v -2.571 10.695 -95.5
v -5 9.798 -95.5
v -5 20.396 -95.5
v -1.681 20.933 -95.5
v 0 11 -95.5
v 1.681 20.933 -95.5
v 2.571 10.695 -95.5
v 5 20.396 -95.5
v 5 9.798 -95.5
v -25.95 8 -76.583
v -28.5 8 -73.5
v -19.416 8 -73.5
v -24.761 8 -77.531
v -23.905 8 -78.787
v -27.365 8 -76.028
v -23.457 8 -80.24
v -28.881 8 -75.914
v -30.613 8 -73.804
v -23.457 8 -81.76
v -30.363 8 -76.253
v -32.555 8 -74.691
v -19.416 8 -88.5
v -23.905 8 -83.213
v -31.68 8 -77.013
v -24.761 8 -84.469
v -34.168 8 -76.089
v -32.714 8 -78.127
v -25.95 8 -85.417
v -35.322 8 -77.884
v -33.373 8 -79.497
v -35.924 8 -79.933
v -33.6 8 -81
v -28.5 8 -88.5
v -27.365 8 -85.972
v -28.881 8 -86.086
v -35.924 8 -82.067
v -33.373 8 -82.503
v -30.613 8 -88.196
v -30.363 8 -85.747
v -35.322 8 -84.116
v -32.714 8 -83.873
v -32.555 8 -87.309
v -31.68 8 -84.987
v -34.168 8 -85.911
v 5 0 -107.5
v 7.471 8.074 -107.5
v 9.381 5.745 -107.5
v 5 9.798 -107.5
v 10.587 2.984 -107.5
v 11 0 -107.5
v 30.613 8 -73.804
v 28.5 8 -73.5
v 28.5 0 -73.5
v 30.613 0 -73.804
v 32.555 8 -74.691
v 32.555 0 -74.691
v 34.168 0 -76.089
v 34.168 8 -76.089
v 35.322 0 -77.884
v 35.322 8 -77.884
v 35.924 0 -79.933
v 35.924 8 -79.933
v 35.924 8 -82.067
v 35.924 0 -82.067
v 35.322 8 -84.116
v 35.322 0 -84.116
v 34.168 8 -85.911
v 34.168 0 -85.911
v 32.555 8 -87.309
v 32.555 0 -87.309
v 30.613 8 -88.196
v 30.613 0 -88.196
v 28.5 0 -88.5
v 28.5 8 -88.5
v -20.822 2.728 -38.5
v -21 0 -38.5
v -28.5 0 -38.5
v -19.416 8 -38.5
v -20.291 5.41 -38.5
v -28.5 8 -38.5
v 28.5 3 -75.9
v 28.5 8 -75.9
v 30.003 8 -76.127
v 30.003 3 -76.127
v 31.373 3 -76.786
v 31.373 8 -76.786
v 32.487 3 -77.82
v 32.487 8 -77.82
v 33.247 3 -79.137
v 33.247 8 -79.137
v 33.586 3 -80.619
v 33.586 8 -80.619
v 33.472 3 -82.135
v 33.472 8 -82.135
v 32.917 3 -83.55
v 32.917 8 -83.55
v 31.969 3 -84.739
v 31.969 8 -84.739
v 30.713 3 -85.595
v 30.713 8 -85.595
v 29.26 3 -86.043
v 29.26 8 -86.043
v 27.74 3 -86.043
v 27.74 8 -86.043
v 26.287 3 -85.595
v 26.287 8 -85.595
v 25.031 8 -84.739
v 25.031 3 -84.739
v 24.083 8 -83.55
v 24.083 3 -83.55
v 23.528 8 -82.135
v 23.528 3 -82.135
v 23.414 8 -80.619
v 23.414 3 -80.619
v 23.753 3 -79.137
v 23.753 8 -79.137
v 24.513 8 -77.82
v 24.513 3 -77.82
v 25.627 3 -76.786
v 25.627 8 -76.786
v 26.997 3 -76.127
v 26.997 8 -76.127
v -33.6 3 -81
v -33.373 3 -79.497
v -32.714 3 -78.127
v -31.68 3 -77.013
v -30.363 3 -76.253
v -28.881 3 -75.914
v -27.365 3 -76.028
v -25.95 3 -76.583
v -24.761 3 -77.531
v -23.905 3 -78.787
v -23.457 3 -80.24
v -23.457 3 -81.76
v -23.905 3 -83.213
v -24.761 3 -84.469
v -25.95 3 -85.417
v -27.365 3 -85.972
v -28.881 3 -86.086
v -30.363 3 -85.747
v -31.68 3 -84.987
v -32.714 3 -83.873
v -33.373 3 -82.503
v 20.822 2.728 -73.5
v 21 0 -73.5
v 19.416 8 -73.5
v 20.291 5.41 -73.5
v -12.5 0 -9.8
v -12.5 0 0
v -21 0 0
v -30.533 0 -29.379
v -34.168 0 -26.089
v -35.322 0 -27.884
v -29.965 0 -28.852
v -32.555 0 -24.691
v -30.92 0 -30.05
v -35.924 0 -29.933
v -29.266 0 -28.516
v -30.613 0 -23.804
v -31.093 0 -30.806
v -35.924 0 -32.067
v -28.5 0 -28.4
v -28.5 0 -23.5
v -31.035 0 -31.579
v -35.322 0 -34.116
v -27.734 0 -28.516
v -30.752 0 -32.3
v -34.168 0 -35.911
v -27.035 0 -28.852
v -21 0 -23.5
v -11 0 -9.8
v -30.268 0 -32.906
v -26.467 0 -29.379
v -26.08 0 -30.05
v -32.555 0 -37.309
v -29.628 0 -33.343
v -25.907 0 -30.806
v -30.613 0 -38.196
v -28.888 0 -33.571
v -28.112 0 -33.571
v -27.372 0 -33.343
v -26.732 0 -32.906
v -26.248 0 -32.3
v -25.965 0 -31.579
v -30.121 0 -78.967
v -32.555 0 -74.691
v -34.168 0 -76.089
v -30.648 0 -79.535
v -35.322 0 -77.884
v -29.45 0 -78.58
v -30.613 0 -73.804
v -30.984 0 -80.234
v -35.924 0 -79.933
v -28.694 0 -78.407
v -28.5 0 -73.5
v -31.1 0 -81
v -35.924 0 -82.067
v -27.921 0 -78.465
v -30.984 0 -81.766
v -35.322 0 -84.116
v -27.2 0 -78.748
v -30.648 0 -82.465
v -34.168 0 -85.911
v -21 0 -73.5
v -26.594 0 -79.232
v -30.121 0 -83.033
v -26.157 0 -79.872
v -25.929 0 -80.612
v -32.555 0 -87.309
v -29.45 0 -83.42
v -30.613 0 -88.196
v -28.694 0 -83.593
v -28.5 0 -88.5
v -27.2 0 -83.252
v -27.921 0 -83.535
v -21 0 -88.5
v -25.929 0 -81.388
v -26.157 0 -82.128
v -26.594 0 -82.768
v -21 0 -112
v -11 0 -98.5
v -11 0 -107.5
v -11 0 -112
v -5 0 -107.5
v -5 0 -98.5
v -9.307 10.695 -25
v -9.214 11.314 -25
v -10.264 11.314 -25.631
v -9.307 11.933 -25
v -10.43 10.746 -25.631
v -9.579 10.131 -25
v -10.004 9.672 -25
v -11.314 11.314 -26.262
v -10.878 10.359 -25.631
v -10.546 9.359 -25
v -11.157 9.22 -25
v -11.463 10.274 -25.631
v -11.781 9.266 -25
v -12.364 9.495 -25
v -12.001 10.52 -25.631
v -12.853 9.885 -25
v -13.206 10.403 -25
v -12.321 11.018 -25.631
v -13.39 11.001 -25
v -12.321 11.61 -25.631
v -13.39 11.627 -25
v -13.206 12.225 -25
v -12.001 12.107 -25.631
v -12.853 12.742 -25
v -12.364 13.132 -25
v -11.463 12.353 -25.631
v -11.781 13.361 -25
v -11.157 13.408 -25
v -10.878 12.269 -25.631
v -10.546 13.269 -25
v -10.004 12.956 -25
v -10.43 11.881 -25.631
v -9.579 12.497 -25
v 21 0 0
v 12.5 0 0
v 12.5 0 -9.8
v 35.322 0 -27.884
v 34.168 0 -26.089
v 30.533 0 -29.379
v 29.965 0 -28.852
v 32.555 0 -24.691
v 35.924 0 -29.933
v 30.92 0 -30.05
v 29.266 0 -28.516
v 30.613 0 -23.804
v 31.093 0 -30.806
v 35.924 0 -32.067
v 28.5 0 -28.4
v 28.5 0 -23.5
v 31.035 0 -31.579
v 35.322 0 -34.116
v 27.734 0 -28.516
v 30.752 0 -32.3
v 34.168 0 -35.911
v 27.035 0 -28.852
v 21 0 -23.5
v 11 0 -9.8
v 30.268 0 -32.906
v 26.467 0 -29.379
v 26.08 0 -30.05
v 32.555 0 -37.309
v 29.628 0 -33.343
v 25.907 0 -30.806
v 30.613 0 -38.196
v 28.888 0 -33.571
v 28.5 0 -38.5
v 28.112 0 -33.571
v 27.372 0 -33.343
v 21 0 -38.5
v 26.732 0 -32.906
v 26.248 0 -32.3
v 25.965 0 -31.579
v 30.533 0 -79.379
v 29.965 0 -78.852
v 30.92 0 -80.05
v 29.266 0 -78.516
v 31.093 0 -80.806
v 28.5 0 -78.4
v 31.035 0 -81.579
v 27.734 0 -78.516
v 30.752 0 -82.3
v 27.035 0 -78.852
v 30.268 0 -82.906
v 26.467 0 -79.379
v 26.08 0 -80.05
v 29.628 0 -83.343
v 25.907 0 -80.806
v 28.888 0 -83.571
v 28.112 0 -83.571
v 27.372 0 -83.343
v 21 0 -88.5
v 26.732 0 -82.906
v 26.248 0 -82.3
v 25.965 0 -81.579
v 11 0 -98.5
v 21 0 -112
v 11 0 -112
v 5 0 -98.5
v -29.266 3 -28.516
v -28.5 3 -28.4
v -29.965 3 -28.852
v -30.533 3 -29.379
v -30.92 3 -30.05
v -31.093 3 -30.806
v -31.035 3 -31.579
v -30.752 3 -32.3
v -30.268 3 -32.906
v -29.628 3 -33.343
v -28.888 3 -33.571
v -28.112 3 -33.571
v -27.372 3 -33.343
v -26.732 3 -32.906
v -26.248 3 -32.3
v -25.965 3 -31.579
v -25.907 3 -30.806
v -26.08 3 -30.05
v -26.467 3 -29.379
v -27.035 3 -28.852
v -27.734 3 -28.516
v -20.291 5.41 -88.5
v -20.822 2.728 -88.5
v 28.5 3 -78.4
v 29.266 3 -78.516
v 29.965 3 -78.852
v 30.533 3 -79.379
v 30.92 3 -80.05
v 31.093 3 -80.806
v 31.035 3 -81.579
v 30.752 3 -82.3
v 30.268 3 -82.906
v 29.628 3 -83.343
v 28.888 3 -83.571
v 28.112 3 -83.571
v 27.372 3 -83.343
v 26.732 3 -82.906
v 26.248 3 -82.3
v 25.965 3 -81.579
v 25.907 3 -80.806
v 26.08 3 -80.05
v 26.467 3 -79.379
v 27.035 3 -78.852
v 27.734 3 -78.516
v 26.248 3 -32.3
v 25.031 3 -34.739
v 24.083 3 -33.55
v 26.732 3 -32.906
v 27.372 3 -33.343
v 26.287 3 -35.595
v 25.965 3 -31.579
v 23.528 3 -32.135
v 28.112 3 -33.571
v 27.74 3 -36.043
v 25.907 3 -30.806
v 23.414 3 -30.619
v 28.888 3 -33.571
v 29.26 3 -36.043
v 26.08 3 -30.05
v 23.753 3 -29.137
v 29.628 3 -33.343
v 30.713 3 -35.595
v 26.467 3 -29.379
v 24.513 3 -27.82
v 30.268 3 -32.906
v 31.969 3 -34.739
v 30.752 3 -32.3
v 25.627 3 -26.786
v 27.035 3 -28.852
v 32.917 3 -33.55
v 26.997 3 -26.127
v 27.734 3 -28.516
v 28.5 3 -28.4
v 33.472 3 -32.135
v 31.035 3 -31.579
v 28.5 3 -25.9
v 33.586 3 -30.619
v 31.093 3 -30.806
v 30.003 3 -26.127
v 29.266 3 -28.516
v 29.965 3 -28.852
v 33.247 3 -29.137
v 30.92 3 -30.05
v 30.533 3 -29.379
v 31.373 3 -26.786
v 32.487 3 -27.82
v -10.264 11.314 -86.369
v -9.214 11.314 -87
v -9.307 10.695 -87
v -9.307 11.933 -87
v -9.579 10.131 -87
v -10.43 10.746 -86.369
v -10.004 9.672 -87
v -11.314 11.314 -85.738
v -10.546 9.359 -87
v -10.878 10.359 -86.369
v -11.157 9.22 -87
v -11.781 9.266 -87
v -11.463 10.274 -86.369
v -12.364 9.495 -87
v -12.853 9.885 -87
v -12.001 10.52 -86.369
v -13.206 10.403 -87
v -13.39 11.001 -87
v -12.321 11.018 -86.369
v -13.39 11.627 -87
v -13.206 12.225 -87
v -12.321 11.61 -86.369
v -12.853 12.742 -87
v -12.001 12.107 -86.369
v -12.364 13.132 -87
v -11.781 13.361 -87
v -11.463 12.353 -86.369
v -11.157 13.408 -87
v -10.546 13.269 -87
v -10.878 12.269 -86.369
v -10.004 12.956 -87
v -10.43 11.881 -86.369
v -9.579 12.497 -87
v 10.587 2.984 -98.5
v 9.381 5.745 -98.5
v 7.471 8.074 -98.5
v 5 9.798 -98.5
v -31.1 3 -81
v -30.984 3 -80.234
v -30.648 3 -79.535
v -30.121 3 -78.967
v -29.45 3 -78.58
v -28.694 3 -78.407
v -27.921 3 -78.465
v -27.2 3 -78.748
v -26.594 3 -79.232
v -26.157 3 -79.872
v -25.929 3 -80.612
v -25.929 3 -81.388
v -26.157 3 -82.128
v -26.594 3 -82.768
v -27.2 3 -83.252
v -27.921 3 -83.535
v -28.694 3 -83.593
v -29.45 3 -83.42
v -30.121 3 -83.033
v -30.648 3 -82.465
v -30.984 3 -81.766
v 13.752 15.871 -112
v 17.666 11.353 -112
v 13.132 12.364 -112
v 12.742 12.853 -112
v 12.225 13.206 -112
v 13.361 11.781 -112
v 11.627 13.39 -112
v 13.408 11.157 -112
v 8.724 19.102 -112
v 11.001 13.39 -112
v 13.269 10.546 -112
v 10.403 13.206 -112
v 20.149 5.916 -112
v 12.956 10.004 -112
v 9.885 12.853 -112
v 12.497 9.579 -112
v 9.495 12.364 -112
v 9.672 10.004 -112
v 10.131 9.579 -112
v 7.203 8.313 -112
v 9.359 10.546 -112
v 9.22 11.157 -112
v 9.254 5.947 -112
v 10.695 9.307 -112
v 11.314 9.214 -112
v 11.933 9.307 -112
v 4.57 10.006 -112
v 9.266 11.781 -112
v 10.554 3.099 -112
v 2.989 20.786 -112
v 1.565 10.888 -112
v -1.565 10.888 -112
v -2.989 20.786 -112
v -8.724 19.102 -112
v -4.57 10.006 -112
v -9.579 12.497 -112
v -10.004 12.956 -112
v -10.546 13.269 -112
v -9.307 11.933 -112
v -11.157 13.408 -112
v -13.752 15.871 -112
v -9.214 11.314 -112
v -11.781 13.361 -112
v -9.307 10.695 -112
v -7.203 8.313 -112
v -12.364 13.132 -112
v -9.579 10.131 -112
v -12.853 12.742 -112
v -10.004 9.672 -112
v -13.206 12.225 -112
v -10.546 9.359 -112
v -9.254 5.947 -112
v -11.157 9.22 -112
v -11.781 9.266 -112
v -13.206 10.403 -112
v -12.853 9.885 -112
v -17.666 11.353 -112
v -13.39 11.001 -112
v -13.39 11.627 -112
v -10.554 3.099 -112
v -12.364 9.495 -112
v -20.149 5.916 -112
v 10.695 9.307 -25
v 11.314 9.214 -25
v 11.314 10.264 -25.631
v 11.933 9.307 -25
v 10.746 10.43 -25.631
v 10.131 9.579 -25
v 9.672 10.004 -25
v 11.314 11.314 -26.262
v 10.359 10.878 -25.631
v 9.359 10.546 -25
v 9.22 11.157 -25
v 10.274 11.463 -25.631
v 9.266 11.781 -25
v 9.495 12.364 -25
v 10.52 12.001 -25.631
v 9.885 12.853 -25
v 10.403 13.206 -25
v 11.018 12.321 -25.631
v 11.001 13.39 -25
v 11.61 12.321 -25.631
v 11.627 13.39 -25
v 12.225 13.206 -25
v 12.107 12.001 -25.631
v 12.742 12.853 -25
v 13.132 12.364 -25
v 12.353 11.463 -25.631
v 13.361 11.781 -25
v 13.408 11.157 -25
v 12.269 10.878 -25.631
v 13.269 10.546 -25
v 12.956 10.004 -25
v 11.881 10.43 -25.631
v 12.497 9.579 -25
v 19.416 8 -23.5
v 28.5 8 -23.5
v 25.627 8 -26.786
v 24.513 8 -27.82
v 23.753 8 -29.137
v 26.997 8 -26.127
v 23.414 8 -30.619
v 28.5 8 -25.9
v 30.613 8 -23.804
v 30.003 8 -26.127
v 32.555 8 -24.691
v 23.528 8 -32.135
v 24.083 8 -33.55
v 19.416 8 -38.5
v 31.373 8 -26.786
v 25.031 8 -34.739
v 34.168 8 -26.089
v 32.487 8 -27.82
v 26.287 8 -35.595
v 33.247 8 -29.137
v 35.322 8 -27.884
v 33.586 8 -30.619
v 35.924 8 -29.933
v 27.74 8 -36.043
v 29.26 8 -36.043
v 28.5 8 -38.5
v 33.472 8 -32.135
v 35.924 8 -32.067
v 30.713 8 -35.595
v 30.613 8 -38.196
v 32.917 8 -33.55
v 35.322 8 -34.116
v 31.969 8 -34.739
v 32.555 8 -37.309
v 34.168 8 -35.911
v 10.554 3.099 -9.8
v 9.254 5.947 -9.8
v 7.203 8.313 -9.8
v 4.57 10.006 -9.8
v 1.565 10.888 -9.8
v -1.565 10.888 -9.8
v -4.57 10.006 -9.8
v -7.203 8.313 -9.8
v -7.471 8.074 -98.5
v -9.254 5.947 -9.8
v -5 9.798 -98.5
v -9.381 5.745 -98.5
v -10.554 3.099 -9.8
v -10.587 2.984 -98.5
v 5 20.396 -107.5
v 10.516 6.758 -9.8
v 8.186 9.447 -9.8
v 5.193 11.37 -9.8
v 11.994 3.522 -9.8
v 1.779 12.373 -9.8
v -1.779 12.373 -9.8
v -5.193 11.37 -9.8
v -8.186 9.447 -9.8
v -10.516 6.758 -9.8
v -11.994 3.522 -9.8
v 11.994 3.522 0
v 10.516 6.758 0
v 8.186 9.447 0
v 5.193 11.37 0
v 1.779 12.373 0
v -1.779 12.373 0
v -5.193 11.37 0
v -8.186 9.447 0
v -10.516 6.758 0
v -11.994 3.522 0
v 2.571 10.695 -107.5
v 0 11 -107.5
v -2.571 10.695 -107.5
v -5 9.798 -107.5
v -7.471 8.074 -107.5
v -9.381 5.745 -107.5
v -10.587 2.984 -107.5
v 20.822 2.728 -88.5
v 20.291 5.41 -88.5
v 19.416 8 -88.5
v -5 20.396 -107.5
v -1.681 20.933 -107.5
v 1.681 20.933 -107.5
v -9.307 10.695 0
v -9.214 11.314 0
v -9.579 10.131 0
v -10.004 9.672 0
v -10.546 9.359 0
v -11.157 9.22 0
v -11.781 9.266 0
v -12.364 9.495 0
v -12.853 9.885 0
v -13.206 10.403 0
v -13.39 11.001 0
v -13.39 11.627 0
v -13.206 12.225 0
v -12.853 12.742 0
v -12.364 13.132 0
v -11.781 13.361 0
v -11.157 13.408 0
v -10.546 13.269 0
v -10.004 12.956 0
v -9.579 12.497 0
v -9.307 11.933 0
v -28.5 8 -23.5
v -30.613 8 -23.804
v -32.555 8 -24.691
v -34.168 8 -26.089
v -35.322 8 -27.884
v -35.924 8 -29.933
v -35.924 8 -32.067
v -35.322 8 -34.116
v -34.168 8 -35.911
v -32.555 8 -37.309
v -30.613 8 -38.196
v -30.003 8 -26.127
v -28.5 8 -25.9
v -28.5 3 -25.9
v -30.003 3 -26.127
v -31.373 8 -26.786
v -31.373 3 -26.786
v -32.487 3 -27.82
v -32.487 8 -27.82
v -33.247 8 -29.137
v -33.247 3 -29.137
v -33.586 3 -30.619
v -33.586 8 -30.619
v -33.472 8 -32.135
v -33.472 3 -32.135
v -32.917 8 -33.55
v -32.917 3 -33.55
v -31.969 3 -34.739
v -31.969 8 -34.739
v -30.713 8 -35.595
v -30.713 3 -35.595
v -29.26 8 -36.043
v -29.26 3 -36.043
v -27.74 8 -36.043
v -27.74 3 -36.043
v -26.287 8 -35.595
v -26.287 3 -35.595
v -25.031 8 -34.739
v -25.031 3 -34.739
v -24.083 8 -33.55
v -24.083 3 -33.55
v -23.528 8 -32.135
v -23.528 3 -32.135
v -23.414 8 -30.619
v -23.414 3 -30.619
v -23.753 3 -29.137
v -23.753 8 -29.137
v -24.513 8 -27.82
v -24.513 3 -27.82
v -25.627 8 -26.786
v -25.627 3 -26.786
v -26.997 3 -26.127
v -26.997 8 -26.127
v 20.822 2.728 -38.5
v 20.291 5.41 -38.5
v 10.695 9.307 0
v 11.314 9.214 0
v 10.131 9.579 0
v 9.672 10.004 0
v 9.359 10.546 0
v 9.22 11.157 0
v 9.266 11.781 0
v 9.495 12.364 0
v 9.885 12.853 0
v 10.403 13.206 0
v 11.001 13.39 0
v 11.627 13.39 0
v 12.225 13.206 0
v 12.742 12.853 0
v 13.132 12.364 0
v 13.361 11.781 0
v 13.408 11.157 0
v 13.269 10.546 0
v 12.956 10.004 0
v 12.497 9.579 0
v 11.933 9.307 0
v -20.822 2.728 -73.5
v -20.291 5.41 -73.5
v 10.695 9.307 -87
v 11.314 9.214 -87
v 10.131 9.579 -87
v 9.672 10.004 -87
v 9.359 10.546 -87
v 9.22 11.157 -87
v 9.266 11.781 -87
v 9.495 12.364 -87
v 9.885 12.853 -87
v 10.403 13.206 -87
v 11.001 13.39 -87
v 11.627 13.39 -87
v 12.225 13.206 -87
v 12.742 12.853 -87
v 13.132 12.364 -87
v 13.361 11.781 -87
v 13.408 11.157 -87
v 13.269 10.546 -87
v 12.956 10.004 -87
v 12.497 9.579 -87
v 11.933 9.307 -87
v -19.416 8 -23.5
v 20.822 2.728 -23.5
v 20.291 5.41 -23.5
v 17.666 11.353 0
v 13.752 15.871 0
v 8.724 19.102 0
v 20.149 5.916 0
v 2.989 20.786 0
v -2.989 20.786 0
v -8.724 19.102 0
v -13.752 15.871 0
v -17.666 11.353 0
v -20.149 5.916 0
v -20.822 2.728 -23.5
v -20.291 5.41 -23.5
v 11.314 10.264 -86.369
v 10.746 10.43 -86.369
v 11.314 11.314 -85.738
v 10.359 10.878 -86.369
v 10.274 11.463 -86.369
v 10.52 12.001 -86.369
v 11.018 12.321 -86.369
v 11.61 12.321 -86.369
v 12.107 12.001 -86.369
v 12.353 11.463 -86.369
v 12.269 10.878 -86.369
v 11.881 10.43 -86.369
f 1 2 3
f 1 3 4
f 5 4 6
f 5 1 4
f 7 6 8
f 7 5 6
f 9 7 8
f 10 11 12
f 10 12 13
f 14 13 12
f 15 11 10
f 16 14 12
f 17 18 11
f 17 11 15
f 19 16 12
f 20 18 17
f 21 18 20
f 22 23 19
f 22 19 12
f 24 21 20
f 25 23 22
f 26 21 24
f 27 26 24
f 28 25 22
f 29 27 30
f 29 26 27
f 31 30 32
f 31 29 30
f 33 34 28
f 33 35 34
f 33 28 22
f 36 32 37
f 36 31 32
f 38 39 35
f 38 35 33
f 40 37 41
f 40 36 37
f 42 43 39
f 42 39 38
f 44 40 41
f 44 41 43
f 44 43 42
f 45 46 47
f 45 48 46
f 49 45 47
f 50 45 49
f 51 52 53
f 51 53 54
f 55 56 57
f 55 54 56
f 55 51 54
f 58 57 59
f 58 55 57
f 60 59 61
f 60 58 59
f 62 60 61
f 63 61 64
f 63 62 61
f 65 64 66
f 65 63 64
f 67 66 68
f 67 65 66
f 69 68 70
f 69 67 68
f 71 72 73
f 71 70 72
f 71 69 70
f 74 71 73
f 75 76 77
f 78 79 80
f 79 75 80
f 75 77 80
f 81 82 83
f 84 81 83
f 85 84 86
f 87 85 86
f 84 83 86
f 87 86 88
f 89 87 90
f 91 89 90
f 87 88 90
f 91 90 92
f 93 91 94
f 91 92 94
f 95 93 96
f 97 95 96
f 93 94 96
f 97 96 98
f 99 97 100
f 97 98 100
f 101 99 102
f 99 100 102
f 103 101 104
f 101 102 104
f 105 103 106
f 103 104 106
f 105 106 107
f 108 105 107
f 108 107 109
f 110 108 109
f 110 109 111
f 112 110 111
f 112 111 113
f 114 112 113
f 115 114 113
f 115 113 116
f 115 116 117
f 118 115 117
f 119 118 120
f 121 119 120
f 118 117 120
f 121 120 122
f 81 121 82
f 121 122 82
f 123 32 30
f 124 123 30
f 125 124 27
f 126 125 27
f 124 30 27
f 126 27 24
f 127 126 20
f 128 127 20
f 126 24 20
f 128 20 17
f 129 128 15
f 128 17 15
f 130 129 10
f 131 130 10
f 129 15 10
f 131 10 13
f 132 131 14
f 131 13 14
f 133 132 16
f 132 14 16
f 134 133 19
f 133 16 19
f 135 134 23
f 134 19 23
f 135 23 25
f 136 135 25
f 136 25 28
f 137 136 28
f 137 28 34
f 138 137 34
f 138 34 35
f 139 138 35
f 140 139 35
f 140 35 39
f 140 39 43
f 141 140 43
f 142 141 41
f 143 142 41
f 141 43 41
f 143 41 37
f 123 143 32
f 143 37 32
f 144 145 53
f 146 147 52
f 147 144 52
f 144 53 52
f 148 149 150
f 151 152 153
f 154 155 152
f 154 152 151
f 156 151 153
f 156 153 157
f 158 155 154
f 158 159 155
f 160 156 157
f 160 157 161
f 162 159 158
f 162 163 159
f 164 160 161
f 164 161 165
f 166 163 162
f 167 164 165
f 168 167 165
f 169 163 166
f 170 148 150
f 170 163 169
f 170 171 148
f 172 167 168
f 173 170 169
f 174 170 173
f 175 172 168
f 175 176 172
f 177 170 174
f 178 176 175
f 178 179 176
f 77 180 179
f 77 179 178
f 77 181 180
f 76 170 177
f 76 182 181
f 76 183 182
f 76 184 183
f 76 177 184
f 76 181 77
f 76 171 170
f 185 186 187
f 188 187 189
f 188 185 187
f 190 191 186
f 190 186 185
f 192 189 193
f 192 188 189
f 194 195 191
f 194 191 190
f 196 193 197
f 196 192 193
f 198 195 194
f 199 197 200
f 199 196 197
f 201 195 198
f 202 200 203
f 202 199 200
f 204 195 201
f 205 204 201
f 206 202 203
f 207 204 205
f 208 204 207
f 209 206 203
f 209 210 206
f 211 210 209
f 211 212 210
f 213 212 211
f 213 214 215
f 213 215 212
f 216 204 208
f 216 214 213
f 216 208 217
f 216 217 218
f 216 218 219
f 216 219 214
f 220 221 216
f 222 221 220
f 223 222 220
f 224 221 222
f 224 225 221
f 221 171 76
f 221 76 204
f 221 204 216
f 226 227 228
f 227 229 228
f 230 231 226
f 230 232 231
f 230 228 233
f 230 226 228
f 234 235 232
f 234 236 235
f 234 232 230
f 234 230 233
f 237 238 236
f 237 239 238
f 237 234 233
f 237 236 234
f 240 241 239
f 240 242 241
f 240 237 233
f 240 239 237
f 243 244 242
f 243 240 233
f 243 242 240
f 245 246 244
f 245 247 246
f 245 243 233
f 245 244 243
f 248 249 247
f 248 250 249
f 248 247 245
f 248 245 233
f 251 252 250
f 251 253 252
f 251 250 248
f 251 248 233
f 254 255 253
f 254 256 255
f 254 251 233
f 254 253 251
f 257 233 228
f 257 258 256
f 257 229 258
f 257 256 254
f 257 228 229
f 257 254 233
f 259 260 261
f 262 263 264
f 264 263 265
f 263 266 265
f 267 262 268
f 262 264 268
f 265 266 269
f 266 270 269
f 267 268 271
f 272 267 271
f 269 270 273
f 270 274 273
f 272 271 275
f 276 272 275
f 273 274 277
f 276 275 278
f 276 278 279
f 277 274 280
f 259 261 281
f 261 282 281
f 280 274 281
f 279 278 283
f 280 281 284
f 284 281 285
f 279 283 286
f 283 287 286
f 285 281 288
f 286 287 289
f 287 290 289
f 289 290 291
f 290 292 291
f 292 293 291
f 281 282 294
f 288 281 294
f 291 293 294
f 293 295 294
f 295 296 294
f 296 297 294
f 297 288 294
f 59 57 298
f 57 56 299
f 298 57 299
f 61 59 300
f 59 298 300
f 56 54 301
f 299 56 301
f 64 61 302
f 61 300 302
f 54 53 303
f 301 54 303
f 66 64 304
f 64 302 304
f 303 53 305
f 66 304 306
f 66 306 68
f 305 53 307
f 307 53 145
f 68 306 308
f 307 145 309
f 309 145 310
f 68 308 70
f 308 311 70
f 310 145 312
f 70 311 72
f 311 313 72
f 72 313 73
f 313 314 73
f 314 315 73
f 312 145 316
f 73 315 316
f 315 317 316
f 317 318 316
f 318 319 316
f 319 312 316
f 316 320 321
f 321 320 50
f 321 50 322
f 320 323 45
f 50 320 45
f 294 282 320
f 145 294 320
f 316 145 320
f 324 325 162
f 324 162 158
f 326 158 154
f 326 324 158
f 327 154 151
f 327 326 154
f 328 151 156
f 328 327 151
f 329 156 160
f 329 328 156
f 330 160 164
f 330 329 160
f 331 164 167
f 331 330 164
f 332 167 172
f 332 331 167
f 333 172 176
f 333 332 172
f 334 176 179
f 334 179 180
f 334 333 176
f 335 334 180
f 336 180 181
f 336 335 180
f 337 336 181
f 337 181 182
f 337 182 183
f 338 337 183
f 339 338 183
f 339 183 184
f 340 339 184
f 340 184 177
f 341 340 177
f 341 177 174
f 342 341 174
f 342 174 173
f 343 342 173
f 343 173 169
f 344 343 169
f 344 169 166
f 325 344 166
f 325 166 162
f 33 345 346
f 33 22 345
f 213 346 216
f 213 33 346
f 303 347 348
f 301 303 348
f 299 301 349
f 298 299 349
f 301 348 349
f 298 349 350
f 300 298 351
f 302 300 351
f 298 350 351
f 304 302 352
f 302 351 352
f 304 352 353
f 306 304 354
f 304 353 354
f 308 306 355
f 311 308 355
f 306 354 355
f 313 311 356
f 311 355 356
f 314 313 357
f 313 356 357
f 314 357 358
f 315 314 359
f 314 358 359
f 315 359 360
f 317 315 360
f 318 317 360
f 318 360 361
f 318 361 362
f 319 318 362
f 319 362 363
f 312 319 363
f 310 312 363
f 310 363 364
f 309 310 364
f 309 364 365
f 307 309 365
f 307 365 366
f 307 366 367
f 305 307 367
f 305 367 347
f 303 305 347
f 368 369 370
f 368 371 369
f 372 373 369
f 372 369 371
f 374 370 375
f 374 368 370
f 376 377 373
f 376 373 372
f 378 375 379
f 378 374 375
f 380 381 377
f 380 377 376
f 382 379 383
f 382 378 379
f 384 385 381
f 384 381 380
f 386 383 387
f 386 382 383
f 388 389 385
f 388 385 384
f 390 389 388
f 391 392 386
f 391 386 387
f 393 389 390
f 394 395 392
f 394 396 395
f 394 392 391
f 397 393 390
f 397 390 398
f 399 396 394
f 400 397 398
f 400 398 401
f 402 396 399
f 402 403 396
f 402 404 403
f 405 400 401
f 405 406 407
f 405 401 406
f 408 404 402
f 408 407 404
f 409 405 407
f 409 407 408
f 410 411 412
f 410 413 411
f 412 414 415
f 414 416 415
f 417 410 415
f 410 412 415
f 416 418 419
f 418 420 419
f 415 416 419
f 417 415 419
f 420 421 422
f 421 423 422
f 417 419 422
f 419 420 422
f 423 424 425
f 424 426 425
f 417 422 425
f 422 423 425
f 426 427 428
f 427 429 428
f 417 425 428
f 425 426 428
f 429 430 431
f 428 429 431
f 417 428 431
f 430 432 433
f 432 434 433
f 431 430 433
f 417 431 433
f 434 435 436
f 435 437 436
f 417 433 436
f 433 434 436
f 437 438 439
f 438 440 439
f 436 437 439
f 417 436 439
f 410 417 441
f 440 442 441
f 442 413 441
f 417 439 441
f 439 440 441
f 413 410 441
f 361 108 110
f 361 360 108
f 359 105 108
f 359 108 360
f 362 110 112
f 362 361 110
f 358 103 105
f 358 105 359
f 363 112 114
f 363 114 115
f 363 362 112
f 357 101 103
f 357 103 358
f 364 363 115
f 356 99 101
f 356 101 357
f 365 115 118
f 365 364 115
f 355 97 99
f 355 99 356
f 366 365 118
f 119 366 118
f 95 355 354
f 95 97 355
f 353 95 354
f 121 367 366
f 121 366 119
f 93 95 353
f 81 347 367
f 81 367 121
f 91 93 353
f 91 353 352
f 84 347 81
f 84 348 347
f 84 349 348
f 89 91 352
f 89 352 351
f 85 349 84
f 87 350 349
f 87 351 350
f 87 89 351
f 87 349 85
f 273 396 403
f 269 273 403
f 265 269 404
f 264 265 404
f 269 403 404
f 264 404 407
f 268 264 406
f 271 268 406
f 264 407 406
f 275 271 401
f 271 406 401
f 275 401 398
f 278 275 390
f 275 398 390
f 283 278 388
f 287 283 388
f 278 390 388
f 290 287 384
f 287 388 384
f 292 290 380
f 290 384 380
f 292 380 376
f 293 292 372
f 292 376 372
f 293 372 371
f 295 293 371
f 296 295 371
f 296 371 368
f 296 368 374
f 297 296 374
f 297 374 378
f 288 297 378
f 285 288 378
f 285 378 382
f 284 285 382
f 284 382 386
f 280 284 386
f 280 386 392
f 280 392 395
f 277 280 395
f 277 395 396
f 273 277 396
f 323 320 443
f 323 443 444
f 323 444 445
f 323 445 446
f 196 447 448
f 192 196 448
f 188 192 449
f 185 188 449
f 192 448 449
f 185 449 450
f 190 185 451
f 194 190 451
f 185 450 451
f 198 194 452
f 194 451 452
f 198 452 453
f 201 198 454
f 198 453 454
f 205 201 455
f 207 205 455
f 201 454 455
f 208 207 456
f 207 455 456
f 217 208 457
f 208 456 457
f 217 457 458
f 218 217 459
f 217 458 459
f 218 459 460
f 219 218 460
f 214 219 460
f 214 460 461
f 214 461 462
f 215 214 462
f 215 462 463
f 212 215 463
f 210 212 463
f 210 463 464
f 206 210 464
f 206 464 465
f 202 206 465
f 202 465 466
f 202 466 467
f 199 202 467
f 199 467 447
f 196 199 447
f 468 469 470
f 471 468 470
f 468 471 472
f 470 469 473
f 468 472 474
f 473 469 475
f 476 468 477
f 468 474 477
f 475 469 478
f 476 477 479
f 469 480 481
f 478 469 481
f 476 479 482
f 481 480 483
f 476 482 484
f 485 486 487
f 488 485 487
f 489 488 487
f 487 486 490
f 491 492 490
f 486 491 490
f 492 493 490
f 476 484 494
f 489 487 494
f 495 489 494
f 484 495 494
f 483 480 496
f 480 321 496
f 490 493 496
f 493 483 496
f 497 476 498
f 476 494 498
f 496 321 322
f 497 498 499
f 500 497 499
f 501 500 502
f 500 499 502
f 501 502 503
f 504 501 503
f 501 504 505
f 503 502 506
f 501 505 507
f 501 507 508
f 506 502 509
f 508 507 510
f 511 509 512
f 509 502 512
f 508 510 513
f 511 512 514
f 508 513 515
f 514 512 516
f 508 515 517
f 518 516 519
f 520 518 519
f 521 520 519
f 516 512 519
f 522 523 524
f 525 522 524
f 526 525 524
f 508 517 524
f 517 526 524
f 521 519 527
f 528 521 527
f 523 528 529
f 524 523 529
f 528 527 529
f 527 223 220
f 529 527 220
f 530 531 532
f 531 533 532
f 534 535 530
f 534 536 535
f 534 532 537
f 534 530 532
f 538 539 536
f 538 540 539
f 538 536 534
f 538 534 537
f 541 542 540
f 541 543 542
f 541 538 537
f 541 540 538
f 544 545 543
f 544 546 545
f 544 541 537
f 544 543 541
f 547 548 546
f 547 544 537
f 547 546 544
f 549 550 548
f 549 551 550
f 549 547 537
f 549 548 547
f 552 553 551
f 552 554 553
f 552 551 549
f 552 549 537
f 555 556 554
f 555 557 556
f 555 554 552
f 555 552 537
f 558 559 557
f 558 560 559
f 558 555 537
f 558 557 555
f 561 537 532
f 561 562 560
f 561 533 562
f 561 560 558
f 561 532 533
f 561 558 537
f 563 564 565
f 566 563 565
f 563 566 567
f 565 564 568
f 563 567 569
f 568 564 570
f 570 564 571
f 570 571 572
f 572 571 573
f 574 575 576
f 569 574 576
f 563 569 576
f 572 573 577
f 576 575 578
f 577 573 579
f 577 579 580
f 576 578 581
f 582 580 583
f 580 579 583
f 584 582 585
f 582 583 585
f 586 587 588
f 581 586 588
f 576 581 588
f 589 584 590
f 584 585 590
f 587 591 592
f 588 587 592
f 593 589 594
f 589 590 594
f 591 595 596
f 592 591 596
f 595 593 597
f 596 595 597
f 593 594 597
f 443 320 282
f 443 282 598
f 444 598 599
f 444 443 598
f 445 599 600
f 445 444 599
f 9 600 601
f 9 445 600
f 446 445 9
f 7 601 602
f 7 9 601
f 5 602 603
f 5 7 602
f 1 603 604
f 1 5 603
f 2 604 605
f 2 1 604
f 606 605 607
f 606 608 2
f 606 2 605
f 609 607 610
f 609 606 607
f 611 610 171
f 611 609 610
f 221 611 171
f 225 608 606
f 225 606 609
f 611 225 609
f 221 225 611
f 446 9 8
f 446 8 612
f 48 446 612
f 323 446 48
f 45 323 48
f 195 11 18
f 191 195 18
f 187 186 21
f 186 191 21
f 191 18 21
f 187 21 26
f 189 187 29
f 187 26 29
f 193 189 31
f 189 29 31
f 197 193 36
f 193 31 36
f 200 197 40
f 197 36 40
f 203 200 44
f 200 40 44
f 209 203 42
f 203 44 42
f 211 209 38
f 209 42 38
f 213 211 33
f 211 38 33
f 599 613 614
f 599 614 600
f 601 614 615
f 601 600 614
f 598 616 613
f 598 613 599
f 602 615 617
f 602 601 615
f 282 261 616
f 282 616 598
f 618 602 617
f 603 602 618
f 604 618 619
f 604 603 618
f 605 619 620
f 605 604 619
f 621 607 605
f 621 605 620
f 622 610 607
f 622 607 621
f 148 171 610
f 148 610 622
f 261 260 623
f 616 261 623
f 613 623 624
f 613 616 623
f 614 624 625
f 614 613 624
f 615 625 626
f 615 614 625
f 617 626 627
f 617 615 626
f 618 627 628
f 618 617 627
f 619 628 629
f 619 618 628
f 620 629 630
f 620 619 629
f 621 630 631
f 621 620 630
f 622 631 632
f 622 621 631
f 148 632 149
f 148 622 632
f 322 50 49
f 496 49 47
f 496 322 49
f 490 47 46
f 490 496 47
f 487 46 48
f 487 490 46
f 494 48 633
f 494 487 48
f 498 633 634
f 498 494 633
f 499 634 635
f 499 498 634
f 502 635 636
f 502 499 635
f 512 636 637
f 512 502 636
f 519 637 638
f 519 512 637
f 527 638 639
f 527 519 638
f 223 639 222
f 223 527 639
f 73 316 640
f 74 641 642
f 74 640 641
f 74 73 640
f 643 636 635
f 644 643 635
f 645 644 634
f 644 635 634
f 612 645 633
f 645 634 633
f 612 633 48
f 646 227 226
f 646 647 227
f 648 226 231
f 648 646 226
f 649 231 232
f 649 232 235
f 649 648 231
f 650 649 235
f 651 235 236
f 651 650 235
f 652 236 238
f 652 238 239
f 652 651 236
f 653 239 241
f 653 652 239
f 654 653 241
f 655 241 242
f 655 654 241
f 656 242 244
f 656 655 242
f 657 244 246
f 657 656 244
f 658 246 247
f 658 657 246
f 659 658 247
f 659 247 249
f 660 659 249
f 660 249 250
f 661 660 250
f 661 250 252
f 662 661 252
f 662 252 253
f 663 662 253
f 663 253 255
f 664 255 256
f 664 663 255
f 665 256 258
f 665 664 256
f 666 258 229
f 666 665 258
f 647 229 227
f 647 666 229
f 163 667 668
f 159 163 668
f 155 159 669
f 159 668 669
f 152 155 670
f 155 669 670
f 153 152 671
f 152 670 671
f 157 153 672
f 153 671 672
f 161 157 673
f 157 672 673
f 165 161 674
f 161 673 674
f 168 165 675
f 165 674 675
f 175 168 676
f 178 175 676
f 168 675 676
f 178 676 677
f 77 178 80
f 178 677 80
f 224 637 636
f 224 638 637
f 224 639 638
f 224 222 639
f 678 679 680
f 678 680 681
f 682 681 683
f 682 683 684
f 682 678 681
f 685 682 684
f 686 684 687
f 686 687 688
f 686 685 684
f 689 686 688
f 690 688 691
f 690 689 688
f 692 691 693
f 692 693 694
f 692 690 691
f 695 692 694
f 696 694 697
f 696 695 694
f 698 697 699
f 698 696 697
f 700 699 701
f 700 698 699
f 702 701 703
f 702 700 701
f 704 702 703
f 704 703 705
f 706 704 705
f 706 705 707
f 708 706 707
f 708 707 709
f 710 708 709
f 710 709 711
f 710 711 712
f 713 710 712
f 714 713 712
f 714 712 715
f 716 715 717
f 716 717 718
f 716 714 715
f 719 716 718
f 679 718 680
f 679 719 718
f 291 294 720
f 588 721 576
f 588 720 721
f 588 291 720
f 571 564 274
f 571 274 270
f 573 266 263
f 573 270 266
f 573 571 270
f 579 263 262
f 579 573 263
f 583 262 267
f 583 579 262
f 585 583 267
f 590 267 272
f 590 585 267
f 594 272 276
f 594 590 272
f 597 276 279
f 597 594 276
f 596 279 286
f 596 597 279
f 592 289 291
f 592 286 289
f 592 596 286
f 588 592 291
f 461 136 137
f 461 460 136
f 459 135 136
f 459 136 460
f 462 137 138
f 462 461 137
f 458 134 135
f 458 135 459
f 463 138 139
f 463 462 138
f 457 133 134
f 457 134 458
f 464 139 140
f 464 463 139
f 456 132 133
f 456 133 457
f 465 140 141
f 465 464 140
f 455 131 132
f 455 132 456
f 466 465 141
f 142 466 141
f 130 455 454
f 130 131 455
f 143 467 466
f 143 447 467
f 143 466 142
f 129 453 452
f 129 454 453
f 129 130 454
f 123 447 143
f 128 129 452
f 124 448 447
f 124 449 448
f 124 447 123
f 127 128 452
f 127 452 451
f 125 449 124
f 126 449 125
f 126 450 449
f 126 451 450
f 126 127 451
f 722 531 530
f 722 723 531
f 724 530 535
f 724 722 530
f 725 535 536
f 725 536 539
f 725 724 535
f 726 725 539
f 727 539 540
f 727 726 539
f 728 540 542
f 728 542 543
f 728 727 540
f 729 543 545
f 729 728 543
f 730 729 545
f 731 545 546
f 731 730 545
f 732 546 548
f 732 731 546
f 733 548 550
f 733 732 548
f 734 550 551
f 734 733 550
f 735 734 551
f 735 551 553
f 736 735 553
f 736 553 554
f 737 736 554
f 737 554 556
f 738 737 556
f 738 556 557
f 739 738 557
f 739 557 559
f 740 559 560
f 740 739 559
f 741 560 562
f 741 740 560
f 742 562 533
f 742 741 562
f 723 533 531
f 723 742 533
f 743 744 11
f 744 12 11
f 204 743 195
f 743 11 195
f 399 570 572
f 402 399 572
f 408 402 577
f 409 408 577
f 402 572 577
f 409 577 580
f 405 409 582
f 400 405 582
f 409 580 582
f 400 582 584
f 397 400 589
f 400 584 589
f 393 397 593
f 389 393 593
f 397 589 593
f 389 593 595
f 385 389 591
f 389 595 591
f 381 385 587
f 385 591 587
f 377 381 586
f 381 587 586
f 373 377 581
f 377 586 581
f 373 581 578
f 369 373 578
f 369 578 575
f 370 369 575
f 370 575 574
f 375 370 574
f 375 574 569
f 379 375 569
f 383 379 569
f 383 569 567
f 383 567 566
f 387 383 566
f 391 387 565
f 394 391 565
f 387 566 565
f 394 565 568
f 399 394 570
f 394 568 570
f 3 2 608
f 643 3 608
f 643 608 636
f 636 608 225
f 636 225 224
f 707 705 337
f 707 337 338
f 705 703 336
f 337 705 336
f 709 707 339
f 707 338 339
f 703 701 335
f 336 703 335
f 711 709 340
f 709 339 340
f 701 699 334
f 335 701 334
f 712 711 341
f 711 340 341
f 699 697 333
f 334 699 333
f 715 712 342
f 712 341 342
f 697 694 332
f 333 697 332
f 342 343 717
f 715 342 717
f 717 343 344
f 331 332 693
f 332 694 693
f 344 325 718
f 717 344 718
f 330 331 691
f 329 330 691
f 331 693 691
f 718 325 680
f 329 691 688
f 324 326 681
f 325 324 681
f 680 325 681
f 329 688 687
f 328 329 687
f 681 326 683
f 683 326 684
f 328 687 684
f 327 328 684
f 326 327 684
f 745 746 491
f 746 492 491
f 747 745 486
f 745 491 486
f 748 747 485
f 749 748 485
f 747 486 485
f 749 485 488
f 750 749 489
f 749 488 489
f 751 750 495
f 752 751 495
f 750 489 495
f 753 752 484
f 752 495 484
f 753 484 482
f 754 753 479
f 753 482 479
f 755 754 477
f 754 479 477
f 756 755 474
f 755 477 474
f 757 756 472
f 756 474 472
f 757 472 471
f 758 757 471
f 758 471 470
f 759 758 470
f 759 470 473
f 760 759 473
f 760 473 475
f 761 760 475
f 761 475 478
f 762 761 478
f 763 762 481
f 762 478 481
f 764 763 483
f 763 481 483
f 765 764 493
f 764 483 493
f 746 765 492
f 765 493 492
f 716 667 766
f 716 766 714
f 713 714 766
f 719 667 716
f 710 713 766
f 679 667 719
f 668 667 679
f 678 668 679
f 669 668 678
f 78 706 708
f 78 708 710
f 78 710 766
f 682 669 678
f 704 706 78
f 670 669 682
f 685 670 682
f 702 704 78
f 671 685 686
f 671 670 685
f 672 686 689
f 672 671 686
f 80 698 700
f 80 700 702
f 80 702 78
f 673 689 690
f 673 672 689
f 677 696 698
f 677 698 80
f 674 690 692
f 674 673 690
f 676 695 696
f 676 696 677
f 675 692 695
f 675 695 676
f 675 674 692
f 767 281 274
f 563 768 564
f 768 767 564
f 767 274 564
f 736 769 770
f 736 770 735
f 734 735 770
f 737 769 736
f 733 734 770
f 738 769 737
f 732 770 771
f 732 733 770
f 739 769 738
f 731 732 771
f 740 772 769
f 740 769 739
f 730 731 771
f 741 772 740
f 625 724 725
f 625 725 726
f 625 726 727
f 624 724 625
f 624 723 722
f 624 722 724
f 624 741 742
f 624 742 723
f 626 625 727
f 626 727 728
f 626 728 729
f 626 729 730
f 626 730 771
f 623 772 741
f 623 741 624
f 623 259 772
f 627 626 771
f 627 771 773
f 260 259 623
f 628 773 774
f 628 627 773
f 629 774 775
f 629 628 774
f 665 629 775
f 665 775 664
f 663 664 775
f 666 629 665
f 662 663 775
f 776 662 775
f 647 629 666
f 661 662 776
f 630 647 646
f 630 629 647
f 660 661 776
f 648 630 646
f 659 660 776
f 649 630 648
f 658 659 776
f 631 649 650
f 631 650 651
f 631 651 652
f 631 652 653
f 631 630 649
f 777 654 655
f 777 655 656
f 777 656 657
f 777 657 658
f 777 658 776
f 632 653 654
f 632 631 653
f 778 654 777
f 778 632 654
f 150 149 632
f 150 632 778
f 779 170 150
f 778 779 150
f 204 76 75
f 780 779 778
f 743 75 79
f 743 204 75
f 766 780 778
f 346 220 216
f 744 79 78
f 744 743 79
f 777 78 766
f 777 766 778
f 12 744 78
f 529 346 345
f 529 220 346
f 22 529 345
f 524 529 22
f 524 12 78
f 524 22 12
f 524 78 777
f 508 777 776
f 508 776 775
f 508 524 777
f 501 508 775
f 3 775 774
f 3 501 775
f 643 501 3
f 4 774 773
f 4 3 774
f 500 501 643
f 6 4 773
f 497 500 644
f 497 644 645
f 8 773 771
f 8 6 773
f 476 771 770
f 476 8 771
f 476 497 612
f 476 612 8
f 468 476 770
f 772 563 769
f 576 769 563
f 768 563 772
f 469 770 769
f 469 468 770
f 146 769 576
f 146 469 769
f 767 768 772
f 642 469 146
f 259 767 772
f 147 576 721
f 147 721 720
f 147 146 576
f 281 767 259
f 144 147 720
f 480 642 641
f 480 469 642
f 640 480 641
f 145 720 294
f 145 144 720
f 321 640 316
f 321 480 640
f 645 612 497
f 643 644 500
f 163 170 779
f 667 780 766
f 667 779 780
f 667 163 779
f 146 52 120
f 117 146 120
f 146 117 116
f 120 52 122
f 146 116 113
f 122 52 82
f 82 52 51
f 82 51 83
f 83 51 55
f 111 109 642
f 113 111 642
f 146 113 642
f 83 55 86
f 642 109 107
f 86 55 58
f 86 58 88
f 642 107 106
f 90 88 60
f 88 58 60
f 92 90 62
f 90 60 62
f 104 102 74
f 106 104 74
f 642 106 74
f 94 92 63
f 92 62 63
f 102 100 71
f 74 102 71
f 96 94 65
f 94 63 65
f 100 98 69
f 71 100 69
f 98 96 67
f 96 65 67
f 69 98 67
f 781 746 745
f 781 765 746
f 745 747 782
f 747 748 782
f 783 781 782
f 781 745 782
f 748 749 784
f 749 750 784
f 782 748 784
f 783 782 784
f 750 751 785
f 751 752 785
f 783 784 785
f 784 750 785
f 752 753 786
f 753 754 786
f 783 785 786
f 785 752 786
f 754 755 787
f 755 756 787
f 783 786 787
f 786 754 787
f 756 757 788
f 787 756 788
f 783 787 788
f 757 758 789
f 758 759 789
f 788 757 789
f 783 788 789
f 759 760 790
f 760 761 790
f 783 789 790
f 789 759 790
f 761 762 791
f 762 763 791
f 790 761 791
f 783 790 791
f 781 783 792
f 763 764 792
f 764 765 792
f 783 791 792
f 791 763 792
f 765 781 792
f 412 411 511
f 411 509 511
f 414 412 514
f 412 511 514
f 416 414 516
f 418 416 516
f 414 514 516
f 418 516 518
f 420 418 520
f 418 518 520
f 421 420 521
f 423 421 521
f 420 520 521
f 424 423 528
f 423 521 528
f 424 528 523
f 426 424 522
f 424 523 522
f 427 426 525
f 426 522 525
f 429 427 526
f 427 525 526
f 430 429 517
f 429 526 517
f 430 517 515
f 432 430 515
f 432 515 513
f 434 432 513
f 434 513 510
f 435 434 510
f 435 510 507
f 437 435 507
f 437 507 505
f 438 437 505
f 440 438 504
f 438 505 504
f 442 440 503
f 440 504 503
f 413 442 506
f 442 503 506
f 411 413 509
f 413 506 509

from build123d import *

# Parameters (mm, degrees)
SKETCH_1_W                  = 21
SKETCH_1_H                  = 112
CUT_EXTRUDE_1_REACH         = 117.871
SKETCH_3_W                  = 42
SKETCH_3_H                  = 25
SKETCH_4_W                  = 15
SKETCH_4_H                  = 8
EXTRUDE_1_DEPTH             = 15
EXTRUDE_1_DIRECTION_2_REACH = 123.445
CUT_EXTRUDE_2_DEPTH         = 8
SKETCH_6_R                  = 2.6
CUT_EXTRUDE_3_DEPTH         = 8
SKETCH_7_R                  = 5.1
CUT_EXTRUDE_4_DEPTH         = 5
PATTERN_LINEAR_1_COUNT      = 2
PATTERN_LINEAR_1_PITCH      = 50
MIRROR_1_COPY_1_SKETCH_W    = 15
MIRROR_1_COPY_1_SKETCH_H    = 8
MIRROR_1_COPY_1_DEPTH       = 15
MIRROR_1_COPY_2_REACH       = 123.445
MIRROR_1_COPY_2_SKETCH_W    = 15
MIRROR_1_COPY_2_SKETCH_H    = 8
MIRROR_1_COPY_3_DEPTH       = 8
MIRROR_1_COPY_4_SKETCH_R    = 2.6
MIRROR_1_COPY_4_DEPTH       = 8
MIRROR_1_COPY_5_SKETCH_R    = 5.1
MIRROR_1_COPY_5_DEPTH       = 5
PATTERN_CIRCULAR_1_COUNT    = 2
PATTERN_CIRCULAR_1_ANGLE    = 90
CUT_EXTRUDE_6_REACH         = 121.503
CUT_EXTRUDE_6_END_RADIUS    = 21
SKETCH_9_W                  = 10
SKETCH_9_H                  = 12


with BuildPart() as part:
    # Эскиз1 → Повернуть1 (revolve)
    with BuildSketch(Plane(origin=(0, 0, 0), x_dir=(1, 0, 0), z_dir=(0, 1, 0))):
        with Locations((10.5, 56)):
            Rectangle(SKETCH_1_W, SKETCH_1_H)
    revolve(axis=Axis((0, 0, 0), (0, 0, -1)))

    # Эскиз2 → Вырез-Повернуть1 (revolve, cut)
    with BuildSketch(Plane(origin=(0, 0, 0), x_dir=(1, 0, 0), z_dir=(0, 1, 0)), mode=Mode.PRIVATE) as cut_revolve_1_sk:
        Polygon((0, 0), (12.5, 0), (12.5, 9.8), (11, 9.8), (11, 98.5), (5, 98.5), (5, 107.5), (11, 107.5), (11, 112), (0, 112), align=None)
    revolve(cut_revolve_1_sk.sketch.rotate(Axis((0, 0, -112), (0, 0, 1)), 180), axis=Axis((0, 0, -112), (0, 0, 1)), mode=Mode.SUBTRACT)

    # Вырез-Вытянуть1: up to this face of the body (flat: up to its plane)
    cut_extrude_1_end = Plane(part.part.faces().sort_by_distance((-20.406030304, 0, -112))[0])
    # Эскиз3 → Вырез-Вытянуть1 (cut, up to the picked face)
    with BuildSketch(Plane.XY, mode=Mode.PRIVATE) as cut_extrude_1_sk1:
        with Locations((0, -12.5)):
            Rectangle(SKETCH_3_W, SKETCH_3_H)
    cut_extrude_1_tool1 = split(extrude(cut_extrude_1_sk1.sketch, amount=-CUT_EXTRUDE_1_REACH, mode=Mode.PRIVATE), bisect_by=cut_extrude_1_end, keep=Keep.BOTH, mode=Mode.PRIVATE)
    add(cut_extrude_1_tool1.solids().sort_by(Axis((0, -12.5, 0), (0, 0, -1)))[0], mode=Mode.SUBTRACT)

    # Эскиз4 → Бобышка-Вытянуть1 (add)
    with BuildSketch(Plane(origin=(21, 0, 0), x_dir=(0, 0, -1), z_dir=(1, 0, 0))):
        with Locations((31, 4)):
            Rectangle(SKETCH_4_W, SKETCH_4_H)
    extrude_1 = extrude(amount=EXTRUDE_1_DEPTH)

    # Эскиз4 → Бобышка-Вытянуть1 direction 2 (add, up to next)
    with BuildSketch(Plane(origin=(21, 0, 0), x_dir=(0, 0, -1), z_dir=(1, 0, 0)), mode=Mode.PRIVATE) as extrude_1_direction_2_sk1:
        with Locations((31, 4)):
            Rectangle(SKETCH_4_W, SKETCH_4_H)
    extrude_1_direction_2_tool1 = extrude(extrude_1_direction_2_sk1.sketch, amount=-EXTRUDE_1_DIRECTION_2_REACH, mode=Mode.PRIVATE) - part.part
    extrude_1_direction_2 = extrude_1_direction_2_tool1.solids().sort_by_distance((21, 4, -31))[0]
    add(extrude_1_direction_2)

    # Эскиз5 → Вырез-Вытянуть2 (cut)
    with BuildSketch(Plane(origin=(0, 8, 0), x_dir=(1, 0, 0), z_dir=(0, 1, 0))):
        with BuildLine():
            Line((28.5, 38.5), (43.5, 38.5))
            Line((43.5, 38.5), (43.5, 23.5))
            Line((43.5, 23.5), (28.5, 23.5))
            ThreePointArc((28.5, 23.5), (36, 31), (28.5, 38.5))
        make_face()
    cut_extrude_2 = extrude(amount=-CUT_EXTRUDE_2_DEPTH, mode=Mode.SUBTRACT)

    # Эскиз6 → Вырез-Вытянуть3 (cut)
    with BuildSketch(Plane(origin=(0, 8, 0), x_dir=(1, 0, 0), z_dir=(0, 1, 0))):
        with Locations(Location((28.5, 31, 0), (0, 0, 270))):
            Circle(SKETCH_6_R)
    cut_extrude_3 = extrude(amount=-CUT_EXTRUDE_3_DEPTH, mode=Mode.SUBTRACT)

    # Эскиз7 → Вырез-Вытянуть4 (cut)
    with BuildSketch(Plane(origin=(0, 8, 0), x_dir=(1, 0, 0), z_dir=(0, 1, 0))):
        with Locations(Location((28.5, 31, 0), (0, 0, 270))):
            Circle(SKETCH_7_R)
    cut_extrude_4 = extrude(amount=-CUT_EXTRUDE_4_DEPTH, mode=Mode.SUBTRACT)

    # Линейный массив1: Бобышка-Вытянуть1, Бобышка-Вытянуть1 direction 2, Вырез-Вытянуть2, Вырез-Вытянуть3, Вырез-Вытянуть4 ×2
    with Locations(*[(0, 0, -i * PATTERN_LINEAR_1_PITCH) for i in range(1, PATTERN_LINEAR_1_COUNT)]):
        add(extrude_1)
        add(extrude_1_direction_2)
        add(cut_extrude_2, mode=Mode.SUBTRACT)
        add(cut_extrude_3, mode=Mode.SUBTRACT)
        add(cut_extrude_4, mode=Mode.SUBTRACT)

    # Зеркальное отражение1: Бобышка-Вытянуть1, Бобышка-Вытянуть1 direction 2, Вырез-Вытянуть2, Вырез-Вытянуть3, Вырез-Вытянуть4 across plane
    add(extrude_1.mirror(Plane(origin=(0, 0, 0), x_dir=(0, 0, 1), z_dir=(1, 0, 0))))
    add(extrude_1_direction_2.mirror(Plane(origin=(0, 0, 0), x_dir=(0, 0, 1), z_dir=(1, 0, 0))))
    add(cut_extrude_2.mirror(Plane(origin=(0, 0, 0), x_dir=(0, 0, 1), z_dir=(1, 0, 0))), mode=Mode.SUBTRACT)
    add(cut_extrude_3.mirror(Plane(origin=(0, 0, 0), x_dir=(0, 0, 1), z_dir=(1, 0, 0))), mode=Mode.SUBTRACT)
    add(cut_extrude_4.mirror(Plane(origin=(0, 0, 0), x_dir=(0, 0, 1), z_dir=(1, 0, 0))), mode=Mode.SUBTRACT)

    # Зеркальное отражение1 copy 1 sketch → Зеркальное отражение1 copy 1 (add)
    with BuildSketch(Plane(origin=(-21, 0, -50), x_dir=(0, 0, -1), z_dir=(-1, 0, 0))):
        with Locations((31, -4)):
            Rectangle(MIRROR_1_COPY_1_SKETCH_W, MIRROR_1_COPY_1_SKETCH_H)
    extrude(amount=MIRROR_1_COPY_1_DEPTH)

    # Зеркальное отражение1 copy 2 sketch → Зеркальное отражение1 copy 2 (add, up to next)
    with BuildSketch(Plane(origin=(-21, 0, -50), x_dir=(0, 0, -1), z_dir=(-1, 0, 0)), mode=Mode.PRIVATE) as mirror_1_copy_2_sk1:
        with Locations((31, -4)):
            Rectangle(MIRROR_1_COPY_2_SKETCH_W, MIRROR_1_COPY_2_SKETCH_H)
    mirror_1_copy_2_tool1 = extrude(mirror_1_copy_2_sk1.sketch, amount=-MIRROR_1_COPY_2_REACH, mode=Mode.PRIVATE) - part.part
    add(mirror_1_copy_2_tool1.solids().sort_by_distance((-21, 4, -81))[0])

    # Зеркальное отражение1 copy 3 sketch → Зеркальное отражение1 copy 3 (cut)
    with BuildSketch(Plane(origin=(0, 8, -50), x_dir=(-1, 0, 0), z_dir=(0, 1, 0))):
        with BuildLine():
            Line((28.5, -38.5), (43.5, -38.5))
            Line((43.5, -38.5), (43.5, -23.5))
            Line((43.5, -23.5), (28.5, -23.5))
            ThreePointArc((28.5, -23.5), (36, -31), (28.5, -38.5))
        make_face()
    extrude(amount=-MIRROR_1_COPY_3_DEPTH, mode=Mode.SUBTRACT)

    # Зеркальное отражение1 copy 4 sketch → Зеркальное отражение1 copy 4 (cut)
    with BuildSketch(Plane(origin=(0, 8, -50), x_dir=(-1, 0, 0), z_dir=(0, 1, 0))):
        with Locations((28.5, -31)):
            Circle(MIRROR_1_COPY_4_SKETCH_R)
    extrude(amount=-MIRROR_1_COPY_4_DEPTH, mode=Mode.SUBTRACT)

    # Зеркальное отражение1 copy 5 sketch → Зеркальное отражение1 copy 5 (cut)
    with BuildSketch(Plane(origin=(0, 8, -50), x_dir=(-1, 0, 0), z_dir=(0, 1, 0))):
        with Locations((28.5, -31)):
            Circle(MIRROR_1_COPY_5_SKETCH_R)
    extrude(amount=-MIRROR_1_COPY_5_DEPTH, mode=Mode.SUBTRACT)

    # Эскиз8 → Сверление под метчик M51 (revolve, cut)
    with BuildSketch(Plane(origin=(11.313708499, 11.313708499, 0), x_dir=(0, -1, 0), z_dir=(1, 0, 0))):
        Polygon((0, 0), (0, 26.2618073), (2.1, 25), (2.1, 0), align=None)
    hole_wizard_m51 = revolve(axis=Axis((11.313708499, 11.313708499, 6.35), (0, 0, -1)), mode=Mode.SUBTRACT)

    # Круговой массив1: Сверление под метчик M51 ×2 about axis
    pattern_circular_1_axis = Axis((0, 0, 0), (0, 0, 1))
    for i in range(1, PATTERN_CIRCULAR_1_COUNT):
        add(hole_wizard_m51.rotate(pattern_circular_1_axis, i * PATTERN_CIRCULAR_1_ANGLE / (PATTERN_CIRCULAR_1_COUNT - 1)), mode=Mode.SUBTRACT)

    # Зеркальное отражение2: Сверление под метчик M51 across plane
    add(hole_wizard_m51.mirror(Plane.XY.offset(-56)), mode=Mode.SUBTRACT)

    # Зеркальное отражение2 copy 1 sketch → Зеркальное отражение2 copy 1 (revolve, cut)
    with BuildSketch(Plane(origin=(-11.313708499, 11.313708499, -112), x_dir=(1, 0, 0), z_dir=(0, 1, 0))):
        Polygon((0, 0), (0, -26.2618073), (2.1, -25), (2.1, 0), align=None)
    revolve(axis=Axis((-11.313708499, 11.313708499, -118.35), (0, 0, -1)), mode=Mode.SUBTRACT)

    # Вырез-Вытянуть6: up to this cylinder (the profile starts inside it)
    cut_extrude_6_end = Plane(origin=(0, 0, -101.5), z_dir=(0, 0, 1)) * Cylinder(CUT_EXTRUDE_6_END_RADIUS, 286.006, mode=Mode.PRIVATE)
    # Эскиз9 → Вырез-Вытянуть6 (cut, up to the surface)
    with BuildSketch(Plane(origin=(0, 0, 0), x_dir=(1, 0, 0), z_dir=(0, 1, 0)), mode=Mode.PRIVATE) as cut_extrude_6_sk1:
        with Locations((0, 101.5)):
            Rectangle(SKETCH_9_W, SKETCH_9_H)
    cut_extrude_6_tool1 = extrude(cut_extrude_6_sk1.sketch, amount=CUT_EXTRUDE_6_REACH, mode=Mode.PRIVATE) & cut_extrude_6_end
    add(cut_extrude_6_tool1.solids().sort_by_distance((0, 0, -101.5))[0], mode=Mode.SUBTRACT)


solid = part.part
